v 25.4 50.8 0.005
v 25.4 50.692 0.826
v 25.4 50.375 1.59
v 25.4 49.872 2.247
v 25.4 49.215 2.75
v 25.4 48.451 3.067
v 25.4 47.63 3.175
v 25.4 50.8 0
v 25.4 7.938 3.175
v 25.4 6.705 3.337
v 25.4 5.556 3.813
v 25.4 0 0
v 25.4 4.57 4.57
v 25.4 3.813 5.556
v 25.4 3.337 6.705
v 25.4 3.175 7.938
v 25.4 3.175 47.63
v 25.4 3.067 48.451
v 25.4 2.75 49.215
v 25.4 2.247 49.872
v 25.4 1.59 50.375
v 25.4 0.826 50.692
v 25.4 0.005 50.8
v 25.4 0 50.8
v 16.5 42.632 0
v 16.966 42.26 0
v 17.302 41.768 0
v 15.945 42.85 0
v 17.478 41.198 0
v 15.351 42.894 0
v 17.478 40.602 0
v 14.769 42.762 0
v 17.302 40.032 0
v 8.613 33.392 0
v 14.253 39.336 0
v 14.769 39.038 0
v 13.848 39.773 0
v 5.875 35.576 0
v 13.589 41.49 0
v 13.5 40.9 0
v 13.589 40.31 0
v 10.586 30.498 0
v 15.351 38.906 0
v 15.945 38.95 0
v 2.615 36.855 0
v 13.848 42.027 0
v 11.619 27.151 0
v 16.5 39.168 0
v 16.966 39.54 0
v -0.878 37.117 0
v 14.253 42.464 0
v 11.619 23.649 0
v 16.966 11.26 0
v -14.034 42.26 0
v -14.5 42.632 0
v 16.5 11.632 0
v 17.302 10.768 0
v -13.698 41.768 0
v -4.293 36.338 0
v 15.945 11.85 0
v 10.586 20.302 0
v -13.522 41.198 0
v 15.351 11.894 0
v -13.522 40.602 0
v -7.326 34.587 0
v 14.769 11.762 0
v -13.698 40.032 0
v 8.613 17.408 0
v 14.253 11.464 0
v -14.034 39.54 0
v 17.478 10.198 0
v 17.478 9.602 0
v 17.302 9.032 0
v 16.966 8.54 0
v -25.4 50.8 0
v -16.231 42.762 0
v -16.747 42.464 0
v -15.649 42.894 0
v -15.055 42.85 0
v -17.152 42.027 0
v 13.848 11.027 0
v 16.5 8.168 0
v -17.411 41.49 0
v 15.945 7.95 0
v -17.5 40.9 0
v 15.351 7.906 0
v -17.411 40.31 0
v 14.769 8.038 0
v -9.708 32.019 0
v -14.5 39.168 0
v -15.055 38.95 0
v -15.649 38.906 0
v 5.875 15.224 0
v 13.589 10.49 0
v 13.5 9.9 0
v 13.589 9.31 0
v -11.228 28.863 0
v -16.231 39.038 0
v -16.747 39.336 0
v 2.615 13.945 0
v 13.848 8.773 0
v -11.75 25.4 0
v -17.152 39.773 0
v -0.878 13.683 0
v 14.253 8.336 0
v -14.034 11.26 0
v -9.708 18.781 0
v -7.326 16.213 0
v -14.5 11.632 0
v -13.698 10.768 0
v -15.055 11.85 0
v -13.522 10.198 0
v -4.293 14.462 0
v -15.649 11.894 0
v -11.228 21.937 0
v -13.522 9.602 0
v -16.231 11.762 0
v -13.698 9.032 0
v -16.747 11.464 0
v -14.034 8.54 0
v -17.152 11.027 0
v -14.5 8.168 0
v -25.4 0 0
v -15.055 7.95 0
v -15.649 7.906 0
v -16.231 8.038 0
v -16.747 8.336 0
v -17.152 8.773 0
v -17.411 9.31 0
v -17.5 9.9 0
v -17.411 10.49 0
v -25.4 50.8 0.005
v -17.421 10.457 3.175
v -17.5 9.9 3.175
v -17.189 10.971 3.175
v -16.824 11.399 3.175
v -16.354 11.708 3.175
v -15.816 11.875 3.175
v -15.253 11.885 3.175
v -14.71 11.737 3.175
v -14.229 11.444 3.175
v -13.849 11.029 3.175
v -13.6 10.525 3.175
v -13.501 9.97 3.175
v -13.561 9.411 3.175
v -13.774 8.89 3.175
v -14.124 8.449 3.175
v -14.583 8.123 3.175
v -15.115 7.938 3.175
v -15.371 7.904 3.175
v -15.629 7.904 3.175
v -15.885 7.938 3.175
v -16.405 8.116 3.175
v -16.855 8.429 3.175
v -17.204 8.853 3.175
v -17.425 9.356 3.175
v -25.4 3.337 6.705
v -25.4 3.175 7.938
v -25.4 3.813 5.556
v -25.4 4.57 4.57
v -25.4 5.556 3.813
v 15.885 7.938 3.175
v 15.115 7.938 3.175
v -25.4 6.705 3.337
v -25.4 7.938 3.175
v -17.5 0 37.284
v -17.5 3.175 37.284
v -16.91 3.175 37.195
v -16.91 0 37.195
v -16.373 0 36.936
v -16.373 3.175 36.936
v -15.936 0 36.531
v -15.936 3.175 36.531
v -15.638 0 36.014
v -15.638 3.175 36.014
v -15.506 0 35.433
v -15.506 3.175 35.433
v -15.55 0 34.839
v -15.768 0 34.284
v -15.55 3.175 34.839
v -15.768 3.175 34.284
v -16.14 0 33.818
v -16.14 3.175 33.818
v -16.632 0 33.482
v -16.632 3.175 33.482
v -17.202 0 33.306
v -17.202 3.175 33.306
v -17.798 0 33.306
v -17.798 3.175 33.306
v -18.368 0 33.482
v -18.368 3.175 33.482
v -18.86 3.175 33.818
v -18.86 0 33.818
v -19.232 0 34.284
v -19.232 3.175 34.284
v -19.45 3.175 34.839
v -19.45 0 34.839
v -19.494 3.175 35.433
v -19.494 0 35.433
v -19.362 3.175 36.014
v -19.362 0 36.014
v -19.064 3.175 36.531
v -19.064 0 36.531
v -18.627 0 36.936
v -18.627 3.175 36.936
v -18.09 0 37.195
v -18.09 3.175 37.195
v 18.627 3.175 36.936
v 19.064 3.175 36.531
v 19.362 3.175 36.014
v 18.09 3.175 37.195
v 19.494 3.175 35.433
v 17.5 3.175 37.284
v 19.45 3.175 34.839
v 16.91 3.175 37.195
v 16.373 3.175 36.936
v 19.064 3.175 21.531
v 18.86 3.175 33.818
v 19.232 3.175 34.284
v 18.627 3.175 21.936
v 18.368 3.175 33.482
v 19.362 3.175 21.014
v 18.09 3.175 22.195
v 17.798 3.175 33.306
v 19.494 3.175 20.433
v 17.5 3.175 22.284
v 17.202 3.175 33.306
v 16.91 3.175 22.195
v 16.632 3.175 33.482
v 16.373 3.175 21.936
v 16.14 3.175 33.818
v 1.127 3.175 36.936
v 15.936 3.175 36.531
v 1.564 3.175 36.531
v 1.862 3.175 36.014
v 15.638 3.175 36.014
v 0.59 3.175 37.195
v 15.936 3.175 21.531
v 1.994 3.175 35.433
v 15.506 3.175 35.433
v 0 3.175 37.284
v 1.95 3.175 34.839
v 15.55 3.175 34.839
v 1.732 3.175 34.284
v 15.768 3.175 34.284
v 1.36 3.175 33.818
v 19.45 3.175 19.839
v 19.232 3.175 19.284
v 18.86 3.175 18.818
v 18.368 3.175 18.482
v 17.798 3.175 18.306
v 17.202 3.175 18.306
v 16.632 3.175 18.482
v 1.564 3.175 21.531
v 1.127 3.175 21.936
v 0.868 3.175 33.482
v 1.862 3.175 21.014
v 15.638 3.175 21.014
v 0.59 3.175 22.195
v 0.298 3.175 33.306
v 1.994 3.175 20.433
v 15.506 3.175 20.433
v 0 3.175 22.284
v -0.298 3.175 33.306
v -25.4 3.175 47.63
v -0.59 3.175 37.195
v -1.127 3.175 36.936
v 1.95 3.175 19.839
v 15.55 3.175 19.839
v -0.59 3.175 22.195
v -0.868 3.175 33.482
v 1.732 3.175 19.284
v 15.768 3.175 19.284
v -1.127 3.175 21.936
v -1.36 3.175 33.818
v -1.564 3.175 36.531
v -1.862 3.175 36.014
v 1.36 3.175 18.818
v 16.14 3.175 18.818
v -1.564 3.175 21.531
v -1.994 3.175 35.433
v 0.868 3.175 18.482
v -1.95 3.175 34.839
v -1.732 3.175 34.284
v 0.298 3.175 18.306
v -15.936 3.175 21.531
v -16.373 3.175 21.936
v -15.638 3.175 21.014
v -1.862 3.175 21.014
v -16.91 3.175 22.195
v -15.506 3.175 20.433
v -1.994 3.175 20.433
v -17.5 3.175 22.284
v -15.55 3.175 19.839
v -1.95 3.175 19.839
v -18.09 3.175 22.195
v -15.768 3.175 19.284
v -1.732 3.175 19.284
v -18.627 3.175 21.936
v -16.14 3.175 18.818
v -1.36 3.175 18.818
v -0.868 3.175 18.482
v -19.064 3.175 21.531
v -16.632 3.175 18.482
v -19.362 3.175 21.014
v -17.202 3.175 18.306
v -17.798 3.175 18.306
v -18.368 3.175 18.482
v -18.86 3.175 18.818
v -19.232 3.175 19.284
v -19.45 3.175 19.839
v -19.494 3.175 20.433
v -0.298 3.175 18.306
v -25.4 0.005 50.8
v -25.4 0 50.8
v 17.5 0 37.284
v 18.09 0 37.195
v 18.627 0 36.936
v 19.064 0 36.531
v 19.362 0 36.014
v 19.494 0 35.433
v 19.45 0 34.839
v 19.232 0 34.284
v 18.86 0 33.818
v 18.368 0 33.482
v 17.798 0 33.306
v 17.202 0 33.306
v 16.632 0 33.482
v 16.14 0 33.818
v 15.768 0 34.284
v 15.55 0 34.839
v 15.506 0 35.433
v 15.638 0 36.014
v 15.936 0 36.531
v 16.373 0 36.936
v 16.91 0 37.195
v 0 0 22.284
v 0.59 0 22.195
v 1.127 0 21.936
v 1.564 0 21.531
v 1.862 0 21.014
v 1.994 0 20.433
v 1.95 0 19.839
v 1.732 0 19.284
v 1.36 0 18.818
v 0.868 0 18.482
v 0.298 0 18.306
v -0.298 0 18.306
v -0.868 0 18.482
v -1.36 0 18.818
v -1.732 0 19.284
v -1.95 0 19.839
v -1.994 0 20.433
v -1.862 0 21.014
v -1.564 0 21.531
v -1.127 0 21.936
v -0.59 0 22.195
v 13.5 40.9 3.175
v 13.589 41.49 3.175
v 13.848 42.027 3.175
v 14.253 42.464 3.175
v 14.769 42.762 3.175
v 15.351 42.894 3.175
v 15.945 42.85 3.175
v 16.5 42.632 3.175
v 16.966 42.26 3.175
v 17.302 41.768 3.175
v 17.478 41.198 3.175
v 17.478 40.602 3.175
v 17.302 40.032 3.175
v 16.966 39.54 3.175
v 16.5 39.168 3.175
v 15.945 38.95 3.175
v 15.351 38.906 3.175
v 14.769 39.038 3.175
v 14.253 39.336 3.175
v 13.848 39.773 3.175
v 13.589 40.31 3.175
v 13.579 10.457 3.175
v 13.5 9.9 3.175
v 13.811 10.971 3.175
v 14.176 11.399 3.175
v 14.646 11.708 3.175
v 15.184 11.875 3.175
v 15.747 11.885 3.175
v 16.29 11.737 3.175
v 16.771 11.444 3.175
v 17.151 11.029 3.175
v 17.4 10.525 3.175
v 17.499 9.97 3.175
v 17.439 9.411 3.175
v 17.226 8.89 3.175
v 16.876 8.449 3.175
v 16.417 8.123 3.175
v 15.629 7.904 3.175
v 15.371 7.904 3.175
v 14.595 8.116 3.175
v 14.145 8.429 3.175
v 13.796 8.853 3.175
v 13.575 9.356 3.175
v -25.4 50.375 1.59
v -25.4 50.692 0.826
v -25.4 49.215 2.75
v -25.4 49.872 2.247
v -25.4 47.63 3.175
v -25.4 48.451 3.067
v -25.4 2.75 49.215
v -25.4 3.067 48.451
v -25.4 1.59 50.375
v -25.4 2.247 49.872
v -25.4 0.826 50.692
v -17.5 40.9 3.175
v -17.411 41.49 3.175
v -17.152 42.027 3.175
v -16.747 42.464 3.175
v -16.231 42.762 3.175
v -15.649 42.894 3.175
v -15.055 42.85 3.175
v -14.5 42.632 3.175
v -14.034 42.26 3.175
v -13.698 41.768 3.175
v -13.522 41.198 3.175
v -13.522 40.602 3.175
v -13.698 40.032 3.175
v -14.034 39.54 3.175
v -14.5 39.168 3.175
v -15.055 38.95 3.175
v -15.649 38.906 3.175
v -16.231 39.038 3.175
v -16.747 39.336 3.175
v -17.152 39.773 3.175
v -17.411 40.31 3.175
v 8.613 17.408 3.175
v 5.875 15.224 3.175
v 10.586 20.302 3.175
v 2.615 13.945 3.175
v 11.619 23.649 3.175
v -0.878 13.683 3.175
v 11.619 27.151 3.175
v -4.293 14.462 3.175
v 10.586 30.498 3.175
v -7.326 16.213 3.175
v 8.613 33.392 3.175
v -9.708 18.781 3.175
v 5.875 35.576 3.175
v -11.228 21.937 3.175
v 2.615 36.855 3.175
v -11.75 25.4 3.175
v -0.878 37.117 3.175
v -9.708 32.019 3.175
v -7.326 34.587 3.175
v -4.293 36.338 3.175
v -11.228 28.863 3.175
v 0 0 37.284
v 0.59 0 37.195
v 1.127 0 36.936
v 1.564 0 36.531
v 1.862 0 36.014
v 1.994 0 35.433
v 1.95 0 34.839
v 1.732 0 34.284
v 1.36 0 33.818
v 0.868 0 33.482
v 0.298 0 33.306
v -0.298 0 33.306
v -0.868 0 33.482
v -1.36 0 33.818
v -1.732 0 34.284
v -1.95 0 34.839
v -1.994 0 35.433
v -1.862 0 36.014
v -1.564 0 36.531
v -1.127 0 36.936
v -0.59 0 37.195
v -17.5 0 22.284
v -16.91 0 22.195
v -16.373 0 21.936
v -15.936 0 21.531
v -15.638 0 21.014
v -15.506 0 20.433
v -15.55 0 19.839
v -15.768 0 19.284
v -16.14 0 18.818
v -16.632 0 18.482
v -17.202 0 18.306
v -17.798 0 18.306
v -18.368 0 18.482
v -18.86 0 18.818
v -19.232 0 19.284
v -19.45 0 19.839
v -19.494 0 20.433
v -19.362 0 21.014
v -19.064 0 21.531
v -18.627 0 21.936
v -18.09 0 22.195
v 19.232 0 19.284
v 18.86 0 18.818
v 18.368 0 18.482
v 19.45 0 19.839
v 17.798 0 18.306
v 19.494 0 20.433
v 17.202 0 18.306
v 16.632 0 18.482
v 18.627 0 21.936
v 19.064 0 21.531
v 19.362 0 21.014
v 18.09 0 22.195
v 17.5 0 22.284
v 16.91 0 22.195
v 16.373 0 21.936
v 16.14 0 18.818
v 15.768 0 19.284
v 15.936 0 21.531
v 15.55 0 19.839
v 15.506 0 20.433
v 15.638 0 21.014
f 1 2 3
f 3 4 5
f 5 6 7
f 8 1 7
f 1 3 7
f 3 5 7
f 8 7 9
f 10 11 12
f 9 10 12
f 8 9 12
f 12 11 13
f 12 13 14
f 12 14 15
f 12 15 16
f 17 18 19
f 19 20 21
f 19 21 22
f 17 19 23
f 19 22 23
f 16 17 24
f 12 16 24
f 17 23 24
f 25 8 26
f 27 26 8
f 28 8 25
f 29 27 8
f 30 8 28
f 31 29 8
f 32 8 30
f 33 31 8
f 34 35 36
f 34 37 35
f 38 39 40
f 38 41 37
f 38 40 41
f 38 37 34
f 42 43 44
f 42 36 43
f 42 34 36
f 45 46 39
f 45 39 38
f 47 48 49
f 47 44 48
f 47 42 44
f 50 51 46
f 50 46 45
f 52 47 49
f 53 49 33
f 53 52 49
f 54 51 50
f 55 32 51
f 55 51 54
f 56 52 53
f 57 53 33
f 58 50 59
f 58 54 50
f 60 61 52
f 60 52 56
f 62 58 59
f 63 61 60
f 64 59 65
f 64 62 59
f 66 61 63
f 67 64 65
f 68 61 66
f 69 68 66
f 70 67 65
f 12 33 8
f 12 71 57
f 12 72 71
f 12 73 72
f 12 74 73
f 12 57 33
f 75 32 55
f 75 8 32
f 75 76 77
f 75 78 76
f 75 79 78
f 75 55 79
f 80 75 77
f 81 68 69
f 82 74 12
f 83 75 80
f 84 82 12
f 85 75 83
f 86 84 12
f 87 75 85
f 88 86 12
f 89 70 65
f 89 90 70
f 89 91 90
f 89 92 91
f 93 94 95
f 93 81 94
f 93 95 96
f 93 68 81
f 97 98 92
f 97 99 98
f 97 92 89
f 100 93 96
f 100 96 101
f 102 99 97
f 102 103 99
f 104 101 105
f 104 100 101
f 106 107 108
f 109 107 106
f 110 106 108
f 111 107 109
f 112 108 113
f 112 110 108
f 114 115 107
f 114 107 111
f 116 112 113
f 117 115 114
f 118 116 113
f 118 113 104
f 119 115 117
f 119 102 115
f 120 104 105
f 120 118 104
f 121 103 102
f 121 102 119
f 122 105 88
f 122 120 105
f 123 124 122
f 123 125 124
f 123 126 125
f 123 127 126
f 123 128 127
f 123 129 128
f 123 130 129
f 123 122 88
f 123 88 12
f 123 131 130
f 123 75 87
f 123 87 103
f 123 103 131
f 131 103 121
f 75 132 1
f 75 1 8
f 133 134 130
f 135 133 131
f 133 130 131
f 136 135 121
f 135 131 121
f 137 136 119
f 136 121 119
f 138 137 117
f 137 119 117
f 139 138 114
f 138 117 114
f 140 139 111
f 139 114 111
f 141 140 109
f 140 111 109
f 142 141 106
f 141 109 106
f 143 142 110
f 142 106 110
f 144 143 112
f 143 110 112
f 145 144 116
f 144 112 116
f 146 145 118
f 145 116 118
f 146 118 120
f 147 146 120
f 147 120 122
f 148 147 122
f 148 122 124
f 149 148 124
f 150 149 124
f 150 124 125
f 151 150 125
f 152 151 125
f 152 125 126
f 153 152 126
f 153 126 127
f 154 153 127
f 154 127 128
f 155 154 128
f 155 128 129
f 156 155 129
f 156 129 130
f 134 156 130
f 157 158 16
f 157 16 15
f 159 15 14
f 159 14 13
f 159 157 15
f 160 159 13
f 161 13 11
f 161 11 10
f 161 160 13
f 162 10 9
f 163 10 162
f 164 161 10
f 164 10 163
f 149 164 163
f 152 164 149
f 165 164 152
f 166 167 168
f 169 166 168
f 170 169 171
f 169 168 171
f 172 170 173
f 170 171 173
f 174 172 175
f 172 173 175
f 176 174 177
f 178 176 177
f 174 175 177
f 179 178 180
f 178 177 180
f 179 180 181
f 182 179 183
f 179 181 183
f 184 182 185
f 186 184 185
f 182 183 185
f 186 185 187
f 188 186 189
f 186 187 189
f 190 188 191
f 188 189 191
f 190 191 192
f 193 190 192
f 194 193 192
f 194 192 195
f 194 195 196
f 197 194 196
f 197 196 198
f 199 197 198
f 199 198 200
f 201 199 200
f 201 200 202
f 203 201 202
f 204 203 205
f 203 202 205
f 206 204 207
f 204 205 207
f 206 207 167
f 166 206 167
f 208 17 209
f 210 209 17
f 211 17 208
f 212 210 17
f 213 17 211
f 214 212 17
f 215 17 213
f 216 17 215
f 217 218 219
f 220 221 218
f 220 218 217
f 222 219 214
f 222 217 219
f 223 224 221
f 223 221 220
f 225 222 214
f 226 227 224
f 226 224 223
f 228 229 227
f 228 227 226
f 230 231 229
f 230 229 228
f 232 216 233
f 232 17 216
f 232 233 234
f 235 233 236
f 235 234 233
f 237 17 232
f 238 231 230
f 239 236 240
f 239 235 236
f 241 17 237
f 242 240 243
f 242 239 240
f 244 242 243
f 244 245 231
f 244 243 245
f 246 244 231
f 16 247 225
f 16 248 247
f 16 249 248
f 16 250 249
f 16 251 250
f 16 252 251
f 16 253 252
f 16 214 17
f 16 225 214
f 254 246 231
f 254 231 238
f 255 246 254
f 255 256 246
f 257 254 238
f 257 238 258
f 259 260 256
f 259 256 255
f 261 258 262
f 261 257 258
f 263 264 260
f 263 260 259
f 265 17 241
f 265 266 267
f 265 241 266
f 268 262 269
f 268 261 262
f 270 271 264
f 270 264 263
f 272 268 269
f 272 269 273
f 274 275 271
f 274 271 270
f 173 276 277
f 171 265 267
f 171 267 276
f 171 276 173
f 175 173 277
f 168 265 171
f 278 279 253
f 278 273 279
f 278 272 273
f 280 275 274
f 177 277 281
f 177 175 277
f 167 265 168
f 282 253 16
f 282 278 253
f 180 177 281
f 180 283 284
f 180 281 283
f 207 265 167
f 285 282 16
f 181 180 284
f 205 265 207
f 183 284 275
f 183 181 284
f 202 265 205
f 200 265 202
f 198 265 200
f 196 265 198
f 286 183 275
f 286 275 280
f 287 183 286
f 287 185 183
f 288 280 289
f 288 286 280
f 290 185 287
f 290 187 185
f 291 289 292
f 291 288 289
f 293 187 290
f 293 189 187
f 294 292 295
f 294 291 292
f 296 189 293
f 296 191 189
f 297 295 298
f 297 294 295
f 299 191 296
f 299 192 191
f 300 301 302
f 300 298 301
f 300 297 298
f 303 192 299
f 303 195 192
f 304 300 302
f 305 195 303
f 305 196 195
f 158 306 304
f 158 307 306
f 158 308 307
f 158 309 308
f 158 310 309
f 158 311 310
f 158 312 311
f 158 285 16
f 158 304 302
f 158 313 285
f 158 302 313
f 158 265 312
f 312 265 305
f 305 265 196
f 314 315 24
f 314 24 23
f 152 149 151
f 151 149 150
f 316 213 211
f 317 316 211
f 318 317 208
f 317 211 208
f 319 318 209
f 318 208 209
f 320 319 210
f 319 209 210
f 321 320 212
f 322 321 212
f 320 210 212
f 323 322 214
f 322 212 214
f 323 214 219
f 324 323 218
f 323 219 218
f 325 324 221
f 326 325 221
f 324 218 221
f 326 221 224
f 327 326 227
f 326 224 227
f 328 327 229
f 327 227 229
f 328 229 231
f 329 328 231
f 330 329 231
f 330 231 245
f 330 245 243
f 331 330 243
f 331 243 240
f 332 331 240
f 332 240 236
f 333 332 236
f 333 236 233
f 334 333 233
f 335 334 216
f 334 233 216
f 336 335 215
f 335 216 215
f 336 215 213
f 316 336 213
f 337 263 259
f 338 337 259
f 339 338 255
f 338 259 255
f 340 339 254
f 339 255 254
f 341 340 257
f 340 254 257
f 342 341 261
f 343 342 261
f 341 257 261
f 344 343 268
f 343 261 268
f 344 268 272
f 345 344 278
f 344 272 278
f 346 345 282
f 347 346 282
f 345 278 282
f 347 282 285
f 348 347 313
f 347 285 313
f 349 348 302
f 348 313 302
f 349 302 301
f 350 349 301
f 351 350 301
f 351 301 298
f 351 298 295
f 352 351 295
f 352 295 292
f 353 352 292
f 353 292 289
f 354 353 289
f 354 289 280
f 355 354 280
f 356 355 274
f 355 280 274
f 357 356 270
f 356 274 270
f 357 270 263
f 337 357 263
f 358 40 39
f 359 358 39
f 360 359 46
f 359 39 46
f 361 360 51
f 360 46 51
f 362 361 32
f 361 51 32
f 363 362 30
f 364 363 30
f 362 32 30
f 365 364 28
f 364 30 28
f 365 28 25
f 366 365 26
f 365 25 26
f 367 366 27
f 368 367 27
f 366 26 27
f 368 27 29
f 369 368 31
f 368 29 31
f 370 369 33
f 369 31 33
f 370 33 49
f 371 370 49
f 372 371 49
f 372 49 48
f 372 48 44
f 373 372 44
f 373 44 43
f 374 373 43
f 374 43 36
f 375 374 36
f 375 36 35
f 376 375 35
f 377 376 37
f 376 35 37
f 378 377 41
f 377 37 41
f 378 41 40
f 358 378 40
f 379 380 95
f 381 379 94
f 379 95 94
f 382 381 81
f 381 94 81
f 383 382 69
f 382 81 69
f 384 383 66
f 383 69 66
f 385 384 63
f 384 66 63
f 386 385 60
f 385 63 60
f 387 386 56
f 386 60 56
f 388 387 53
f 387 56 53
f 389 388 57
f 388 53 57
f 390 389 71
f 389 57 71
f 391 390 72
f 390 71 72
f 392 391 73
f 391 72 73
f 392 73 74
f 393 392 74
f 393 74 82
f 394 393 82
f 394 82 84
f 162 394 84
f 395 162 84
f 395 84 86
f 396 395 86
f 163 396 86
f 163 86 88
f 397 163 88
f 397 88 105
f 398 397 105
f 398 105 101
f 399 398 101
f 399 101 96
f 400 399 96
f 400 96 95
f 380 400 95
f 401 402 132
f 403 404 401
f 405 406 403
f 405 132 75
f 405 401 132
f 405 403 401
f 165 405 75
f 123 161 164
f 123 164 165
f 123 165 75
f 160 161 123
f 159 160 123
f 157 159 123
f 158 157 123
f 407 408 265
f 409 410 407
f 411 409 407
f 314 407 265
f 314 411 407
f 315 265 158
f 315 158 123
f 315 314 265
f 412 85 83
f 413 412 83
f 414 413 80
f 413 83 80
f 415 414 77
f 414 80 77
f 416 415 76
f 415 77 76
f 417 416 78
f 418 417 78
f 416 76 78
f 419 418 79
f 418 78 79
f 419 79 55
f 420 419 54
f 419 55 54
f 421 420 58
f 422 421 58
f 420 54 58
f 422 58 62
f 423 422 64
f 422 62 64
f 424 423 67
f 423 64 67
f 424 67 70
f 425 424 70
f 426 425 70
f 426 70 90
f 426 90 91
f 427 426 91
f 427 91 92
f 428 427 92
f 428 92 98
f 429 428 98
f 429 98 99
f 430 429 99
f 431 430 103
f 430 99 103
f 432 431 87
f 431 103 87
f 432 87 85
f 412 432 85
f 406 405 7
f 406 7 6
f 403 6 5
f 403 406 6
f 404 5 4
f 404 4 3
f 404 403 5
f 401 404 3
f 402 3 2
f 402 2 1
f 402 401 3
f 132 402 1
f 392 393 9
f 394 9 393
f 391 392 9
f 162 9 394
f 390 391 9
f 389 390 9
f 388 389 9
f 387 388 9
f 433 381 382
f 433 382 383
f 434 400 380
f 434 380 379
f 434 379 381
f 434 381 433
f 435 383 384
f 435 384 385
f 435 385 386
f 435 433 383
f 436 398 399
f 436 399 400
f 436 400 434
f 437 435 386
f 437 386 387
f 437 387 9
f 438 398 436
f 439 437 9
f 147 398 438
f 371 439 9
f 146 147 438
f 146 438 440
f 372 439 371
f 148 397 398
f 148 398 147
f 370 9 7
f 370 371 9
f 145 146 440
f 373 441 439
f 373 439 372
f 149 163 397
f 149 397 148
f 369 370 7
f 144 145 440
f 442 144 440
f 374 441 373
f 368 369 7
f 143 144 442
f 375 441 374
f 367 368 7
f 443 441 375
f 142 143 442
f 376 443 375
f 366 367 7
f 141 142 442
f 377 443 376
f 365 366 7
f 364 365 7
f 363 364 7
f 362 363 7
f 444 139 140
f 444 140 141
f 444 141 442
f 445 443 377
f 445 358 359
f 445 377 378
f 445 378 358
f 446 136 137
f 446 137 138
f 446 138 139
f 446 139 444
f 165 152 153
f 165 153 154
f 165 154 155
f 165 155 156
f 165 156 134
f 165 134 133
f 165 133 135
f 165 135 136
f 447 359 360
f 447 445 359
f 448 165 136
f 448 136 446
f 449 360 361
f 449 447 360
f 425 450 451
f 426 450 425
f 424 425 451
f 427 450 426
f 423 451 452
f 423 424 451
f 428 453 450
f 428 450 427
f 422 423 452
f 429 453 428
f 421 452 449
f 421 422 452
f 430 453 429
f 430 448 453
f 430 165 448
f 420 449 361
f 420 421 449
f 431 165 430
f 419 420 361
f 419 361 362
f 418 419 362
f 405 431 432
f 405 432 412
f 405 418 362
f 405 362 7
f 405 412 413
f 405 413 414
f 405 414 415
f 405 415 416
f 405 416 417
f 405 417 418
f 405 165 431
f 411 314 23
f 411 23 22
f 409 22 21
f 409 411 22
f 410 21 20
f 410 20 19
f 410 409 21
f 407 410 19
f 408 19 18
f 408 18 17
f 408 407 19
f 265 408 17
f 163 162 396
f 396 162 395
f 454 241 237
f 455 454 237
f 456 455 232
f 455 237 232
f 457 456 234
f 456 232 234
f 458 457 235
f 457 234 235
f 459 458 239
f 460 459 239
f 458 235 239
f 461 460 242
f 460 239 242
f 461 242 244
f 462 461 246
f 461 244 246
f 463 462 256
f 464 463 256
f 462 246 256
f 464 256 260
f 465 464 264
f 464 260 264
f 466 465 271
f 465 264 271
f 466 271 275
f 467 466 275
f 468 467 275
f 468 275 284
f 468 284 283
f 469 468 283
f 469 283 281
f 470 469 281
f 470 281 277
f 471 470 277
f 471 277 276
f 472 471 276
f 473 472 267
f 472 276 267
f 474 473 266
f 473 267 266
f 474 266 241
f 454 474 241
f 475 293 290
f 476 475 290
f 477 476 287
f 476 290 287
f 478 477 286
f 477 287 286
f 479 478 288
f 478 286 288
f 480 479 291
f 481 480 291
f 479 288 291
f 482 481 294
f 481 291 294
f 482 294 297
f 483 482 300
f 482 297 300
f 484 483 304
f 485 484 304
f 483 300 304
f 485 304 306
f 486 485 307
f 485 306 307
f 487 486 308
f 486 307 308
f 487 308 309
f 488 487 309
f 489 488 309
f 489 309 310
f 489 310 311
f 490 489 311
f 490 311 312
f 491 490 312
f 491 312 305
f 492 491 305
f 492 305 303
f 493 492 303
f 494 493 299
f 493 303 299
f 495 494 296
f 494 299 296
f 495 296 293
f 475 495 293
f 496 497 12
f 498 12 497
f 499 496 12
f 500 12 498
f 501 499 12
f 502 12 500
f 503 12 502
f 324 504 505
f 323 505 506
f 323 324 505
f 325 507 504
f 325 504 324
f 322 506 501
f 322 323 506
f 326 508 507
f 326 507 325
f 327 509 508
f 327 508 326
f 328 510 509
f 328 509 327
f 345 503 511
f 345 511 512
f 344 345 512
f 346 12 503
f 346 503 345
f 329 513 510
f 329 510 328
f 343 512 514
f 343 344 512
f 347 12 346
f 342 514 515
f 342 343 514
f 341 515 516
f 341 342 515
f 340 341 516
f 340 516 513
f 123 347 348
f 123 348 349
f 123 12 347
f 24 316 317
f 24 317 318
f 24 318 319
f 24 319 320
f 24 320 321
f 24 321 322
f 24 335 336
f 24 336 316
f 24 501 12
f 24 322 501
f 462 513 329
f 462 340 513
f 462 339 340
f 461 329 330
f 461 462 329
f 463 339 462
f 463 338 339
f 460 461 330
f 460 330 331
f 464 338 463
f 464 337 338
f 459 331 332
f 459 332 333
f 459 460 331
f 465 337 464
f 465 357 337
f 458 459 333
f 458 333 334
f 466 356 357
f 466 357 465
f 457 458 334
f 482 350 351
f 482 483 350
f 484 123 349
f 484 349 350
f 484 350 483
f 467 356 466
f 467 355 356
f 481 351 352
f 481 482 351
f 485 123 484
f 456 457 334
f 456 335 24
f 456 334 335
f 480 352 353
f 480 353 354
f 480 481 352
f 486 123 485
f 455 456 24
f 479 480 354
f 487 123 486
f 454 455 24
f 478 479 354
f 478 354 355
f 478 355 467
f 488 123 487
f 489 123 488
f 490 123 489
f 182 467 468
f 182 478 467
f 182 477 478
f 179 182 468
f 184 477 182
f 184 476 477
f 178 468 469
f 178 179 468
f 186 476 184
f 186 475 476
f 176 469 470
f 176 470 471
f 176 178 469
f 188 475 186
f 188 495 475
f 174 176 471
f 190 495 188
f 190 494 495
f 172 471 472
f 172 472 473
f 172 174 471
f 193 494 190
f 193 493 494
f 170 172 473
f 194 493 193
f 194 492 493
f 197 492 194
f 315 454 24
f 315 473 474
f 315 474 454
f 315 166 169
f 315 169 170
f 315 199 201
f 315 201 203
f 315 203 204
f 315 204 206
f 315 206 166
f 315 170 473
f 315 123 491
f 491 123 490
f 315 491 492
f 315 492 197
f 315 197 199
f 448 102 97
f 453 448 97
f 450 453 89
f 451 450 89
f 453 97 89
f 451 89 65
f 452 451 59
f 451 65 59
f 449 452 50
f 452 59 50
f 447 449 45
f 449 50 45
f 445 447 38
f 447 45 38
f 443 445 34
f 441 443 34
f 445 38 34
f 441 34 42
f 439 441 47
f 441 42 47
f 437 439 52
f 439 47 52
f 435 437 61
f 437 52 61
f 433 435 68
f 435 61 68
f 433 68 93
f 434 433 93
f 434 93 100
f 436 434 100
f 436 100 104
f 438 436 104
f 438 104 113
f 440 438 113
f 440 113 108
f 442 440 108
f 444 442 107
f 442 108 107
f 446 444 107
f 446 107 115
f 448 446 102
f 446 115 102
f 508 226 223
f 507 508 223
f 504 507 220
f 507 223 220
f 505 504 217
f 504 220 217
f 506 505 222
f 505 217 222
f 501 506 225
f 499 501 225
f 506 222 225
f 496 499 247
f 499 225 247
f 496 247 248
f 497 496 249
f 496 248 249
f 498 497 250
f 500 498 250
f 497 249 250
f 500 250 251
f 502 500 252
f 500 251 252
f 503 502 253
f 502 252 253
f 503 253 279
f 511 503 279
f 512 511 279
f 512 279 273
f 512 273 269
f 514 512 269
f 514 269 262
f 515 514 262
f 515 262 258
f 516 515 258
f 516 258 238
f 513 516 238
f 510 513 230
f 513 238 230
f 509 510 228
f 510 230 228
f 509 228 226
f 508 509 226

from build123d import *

# Parameters (mm, degrees)
HIERRO_ANGULAR_2_X_2_X_0_125_1_DEPTH = 50.8
CROQUIS3_R                           = 11.75
CROQUIS3_R_2                         = 2
CORTAR_EXTRUIR1_DEPTH                = 3.175
CROQUIS4_R                           = 2
CORTAR_EXTRUIR2_DEPTH                = 3.175


with BuildPart() as part:
    # Sketch1 → Hierro angular 2 X 2 X 0.125(1) (new body)
    with BuildSketch(Plane.YZ.offset(-25.4)):
        with BuildLine():
            Line((0, 0), (0, 50.8))
            Line((0, 50.8), (0.00508, 50.8))
            ThreePointArc((0.00508, 50.8), (2.246551928, 49.871551928), (3.175, 47.63008))
            Line((3.175, 47.63008), (3.175, 7.9375))
            ThreePointArc((3.175, 7.9375), (4.569903955, 4.569903955), (7.9375, 3.175))
            Line((7.9375, 3.175), (47.63008, 3.175))
            ThreePointArc((47.63008, 3.175), (49.871551928, 2.246551928), (50.8, 0.00508))
            Line((50.8, 0.00508), (50.8, 0))
            Line((50.8, 0), (0, 0))
        make_face()
    extrude(amount=HIERRO_ANGULAR_2_X_2_X_0_125_1_DEPTH)

    # Croquis3 → Cortar-Extruir1 (cut)
    with BuildSketch(Plane(origin=(0, 0, 0), x_dir=(-1, 0, 0), z_dir=(0, 0, -1))):
        with Locations((0, 25.4)):
            Circle(CROQUIS3_R)
        with Locations((-15.5, 40.9)):
            Circle(CROQUIS3_R_2)
        with Locations((15.5, 40.9)):
            Circle(CROQUIS3_R_2)
        with Locations((15.5, 9.9)):
            Circle(CROQUIS3_R_2)
        with Locations((-15.5, 9.9)):
            Circle(CROQUIS3_R_2)
    extrude(amount=-CORTAR_EXTRUIR1_DEPTH, mode=Mode.SUBTRACT)

    # Croquis4 → Cortar-Extruir2 (cut)
    with BuildSketch(Plane(origin=(0, 3.175, 0), x_dir=(1, 0, 0), z_dir=(0, 1, 0))):
        with Locations(Location((-17.5, -20.28379, 0), (0, 0, 270))):
            Circle(CROQUIS4_R)
        with Locations(Location((17.5, -20.28379, 0), (0, 0, 270))):
            Circle(CROQUIS4_R)
        with Locations(Location((17.5, -35.28379, 0), (0, 0, 270))):
            Circle(CROQUIS4_R)
        with Locations(Location((-17.5, -35.28379, 0), (0, 0, 270))):
            Circle(CROQUIS4_R)
        with Locations(Location((0, -20.28379, 0), (0, 0, 270))):
            Circle(CROQUIS4_R)
        with Locations(Location((0, -35.28379, 0), (0, 0, 270))):
            Circle(CROQUIS4_R)
    extrude(amount=-CORTAR_EXTRUIR2_DEPTH, mode=Mode.SUBTRACT)


solid = part.part
